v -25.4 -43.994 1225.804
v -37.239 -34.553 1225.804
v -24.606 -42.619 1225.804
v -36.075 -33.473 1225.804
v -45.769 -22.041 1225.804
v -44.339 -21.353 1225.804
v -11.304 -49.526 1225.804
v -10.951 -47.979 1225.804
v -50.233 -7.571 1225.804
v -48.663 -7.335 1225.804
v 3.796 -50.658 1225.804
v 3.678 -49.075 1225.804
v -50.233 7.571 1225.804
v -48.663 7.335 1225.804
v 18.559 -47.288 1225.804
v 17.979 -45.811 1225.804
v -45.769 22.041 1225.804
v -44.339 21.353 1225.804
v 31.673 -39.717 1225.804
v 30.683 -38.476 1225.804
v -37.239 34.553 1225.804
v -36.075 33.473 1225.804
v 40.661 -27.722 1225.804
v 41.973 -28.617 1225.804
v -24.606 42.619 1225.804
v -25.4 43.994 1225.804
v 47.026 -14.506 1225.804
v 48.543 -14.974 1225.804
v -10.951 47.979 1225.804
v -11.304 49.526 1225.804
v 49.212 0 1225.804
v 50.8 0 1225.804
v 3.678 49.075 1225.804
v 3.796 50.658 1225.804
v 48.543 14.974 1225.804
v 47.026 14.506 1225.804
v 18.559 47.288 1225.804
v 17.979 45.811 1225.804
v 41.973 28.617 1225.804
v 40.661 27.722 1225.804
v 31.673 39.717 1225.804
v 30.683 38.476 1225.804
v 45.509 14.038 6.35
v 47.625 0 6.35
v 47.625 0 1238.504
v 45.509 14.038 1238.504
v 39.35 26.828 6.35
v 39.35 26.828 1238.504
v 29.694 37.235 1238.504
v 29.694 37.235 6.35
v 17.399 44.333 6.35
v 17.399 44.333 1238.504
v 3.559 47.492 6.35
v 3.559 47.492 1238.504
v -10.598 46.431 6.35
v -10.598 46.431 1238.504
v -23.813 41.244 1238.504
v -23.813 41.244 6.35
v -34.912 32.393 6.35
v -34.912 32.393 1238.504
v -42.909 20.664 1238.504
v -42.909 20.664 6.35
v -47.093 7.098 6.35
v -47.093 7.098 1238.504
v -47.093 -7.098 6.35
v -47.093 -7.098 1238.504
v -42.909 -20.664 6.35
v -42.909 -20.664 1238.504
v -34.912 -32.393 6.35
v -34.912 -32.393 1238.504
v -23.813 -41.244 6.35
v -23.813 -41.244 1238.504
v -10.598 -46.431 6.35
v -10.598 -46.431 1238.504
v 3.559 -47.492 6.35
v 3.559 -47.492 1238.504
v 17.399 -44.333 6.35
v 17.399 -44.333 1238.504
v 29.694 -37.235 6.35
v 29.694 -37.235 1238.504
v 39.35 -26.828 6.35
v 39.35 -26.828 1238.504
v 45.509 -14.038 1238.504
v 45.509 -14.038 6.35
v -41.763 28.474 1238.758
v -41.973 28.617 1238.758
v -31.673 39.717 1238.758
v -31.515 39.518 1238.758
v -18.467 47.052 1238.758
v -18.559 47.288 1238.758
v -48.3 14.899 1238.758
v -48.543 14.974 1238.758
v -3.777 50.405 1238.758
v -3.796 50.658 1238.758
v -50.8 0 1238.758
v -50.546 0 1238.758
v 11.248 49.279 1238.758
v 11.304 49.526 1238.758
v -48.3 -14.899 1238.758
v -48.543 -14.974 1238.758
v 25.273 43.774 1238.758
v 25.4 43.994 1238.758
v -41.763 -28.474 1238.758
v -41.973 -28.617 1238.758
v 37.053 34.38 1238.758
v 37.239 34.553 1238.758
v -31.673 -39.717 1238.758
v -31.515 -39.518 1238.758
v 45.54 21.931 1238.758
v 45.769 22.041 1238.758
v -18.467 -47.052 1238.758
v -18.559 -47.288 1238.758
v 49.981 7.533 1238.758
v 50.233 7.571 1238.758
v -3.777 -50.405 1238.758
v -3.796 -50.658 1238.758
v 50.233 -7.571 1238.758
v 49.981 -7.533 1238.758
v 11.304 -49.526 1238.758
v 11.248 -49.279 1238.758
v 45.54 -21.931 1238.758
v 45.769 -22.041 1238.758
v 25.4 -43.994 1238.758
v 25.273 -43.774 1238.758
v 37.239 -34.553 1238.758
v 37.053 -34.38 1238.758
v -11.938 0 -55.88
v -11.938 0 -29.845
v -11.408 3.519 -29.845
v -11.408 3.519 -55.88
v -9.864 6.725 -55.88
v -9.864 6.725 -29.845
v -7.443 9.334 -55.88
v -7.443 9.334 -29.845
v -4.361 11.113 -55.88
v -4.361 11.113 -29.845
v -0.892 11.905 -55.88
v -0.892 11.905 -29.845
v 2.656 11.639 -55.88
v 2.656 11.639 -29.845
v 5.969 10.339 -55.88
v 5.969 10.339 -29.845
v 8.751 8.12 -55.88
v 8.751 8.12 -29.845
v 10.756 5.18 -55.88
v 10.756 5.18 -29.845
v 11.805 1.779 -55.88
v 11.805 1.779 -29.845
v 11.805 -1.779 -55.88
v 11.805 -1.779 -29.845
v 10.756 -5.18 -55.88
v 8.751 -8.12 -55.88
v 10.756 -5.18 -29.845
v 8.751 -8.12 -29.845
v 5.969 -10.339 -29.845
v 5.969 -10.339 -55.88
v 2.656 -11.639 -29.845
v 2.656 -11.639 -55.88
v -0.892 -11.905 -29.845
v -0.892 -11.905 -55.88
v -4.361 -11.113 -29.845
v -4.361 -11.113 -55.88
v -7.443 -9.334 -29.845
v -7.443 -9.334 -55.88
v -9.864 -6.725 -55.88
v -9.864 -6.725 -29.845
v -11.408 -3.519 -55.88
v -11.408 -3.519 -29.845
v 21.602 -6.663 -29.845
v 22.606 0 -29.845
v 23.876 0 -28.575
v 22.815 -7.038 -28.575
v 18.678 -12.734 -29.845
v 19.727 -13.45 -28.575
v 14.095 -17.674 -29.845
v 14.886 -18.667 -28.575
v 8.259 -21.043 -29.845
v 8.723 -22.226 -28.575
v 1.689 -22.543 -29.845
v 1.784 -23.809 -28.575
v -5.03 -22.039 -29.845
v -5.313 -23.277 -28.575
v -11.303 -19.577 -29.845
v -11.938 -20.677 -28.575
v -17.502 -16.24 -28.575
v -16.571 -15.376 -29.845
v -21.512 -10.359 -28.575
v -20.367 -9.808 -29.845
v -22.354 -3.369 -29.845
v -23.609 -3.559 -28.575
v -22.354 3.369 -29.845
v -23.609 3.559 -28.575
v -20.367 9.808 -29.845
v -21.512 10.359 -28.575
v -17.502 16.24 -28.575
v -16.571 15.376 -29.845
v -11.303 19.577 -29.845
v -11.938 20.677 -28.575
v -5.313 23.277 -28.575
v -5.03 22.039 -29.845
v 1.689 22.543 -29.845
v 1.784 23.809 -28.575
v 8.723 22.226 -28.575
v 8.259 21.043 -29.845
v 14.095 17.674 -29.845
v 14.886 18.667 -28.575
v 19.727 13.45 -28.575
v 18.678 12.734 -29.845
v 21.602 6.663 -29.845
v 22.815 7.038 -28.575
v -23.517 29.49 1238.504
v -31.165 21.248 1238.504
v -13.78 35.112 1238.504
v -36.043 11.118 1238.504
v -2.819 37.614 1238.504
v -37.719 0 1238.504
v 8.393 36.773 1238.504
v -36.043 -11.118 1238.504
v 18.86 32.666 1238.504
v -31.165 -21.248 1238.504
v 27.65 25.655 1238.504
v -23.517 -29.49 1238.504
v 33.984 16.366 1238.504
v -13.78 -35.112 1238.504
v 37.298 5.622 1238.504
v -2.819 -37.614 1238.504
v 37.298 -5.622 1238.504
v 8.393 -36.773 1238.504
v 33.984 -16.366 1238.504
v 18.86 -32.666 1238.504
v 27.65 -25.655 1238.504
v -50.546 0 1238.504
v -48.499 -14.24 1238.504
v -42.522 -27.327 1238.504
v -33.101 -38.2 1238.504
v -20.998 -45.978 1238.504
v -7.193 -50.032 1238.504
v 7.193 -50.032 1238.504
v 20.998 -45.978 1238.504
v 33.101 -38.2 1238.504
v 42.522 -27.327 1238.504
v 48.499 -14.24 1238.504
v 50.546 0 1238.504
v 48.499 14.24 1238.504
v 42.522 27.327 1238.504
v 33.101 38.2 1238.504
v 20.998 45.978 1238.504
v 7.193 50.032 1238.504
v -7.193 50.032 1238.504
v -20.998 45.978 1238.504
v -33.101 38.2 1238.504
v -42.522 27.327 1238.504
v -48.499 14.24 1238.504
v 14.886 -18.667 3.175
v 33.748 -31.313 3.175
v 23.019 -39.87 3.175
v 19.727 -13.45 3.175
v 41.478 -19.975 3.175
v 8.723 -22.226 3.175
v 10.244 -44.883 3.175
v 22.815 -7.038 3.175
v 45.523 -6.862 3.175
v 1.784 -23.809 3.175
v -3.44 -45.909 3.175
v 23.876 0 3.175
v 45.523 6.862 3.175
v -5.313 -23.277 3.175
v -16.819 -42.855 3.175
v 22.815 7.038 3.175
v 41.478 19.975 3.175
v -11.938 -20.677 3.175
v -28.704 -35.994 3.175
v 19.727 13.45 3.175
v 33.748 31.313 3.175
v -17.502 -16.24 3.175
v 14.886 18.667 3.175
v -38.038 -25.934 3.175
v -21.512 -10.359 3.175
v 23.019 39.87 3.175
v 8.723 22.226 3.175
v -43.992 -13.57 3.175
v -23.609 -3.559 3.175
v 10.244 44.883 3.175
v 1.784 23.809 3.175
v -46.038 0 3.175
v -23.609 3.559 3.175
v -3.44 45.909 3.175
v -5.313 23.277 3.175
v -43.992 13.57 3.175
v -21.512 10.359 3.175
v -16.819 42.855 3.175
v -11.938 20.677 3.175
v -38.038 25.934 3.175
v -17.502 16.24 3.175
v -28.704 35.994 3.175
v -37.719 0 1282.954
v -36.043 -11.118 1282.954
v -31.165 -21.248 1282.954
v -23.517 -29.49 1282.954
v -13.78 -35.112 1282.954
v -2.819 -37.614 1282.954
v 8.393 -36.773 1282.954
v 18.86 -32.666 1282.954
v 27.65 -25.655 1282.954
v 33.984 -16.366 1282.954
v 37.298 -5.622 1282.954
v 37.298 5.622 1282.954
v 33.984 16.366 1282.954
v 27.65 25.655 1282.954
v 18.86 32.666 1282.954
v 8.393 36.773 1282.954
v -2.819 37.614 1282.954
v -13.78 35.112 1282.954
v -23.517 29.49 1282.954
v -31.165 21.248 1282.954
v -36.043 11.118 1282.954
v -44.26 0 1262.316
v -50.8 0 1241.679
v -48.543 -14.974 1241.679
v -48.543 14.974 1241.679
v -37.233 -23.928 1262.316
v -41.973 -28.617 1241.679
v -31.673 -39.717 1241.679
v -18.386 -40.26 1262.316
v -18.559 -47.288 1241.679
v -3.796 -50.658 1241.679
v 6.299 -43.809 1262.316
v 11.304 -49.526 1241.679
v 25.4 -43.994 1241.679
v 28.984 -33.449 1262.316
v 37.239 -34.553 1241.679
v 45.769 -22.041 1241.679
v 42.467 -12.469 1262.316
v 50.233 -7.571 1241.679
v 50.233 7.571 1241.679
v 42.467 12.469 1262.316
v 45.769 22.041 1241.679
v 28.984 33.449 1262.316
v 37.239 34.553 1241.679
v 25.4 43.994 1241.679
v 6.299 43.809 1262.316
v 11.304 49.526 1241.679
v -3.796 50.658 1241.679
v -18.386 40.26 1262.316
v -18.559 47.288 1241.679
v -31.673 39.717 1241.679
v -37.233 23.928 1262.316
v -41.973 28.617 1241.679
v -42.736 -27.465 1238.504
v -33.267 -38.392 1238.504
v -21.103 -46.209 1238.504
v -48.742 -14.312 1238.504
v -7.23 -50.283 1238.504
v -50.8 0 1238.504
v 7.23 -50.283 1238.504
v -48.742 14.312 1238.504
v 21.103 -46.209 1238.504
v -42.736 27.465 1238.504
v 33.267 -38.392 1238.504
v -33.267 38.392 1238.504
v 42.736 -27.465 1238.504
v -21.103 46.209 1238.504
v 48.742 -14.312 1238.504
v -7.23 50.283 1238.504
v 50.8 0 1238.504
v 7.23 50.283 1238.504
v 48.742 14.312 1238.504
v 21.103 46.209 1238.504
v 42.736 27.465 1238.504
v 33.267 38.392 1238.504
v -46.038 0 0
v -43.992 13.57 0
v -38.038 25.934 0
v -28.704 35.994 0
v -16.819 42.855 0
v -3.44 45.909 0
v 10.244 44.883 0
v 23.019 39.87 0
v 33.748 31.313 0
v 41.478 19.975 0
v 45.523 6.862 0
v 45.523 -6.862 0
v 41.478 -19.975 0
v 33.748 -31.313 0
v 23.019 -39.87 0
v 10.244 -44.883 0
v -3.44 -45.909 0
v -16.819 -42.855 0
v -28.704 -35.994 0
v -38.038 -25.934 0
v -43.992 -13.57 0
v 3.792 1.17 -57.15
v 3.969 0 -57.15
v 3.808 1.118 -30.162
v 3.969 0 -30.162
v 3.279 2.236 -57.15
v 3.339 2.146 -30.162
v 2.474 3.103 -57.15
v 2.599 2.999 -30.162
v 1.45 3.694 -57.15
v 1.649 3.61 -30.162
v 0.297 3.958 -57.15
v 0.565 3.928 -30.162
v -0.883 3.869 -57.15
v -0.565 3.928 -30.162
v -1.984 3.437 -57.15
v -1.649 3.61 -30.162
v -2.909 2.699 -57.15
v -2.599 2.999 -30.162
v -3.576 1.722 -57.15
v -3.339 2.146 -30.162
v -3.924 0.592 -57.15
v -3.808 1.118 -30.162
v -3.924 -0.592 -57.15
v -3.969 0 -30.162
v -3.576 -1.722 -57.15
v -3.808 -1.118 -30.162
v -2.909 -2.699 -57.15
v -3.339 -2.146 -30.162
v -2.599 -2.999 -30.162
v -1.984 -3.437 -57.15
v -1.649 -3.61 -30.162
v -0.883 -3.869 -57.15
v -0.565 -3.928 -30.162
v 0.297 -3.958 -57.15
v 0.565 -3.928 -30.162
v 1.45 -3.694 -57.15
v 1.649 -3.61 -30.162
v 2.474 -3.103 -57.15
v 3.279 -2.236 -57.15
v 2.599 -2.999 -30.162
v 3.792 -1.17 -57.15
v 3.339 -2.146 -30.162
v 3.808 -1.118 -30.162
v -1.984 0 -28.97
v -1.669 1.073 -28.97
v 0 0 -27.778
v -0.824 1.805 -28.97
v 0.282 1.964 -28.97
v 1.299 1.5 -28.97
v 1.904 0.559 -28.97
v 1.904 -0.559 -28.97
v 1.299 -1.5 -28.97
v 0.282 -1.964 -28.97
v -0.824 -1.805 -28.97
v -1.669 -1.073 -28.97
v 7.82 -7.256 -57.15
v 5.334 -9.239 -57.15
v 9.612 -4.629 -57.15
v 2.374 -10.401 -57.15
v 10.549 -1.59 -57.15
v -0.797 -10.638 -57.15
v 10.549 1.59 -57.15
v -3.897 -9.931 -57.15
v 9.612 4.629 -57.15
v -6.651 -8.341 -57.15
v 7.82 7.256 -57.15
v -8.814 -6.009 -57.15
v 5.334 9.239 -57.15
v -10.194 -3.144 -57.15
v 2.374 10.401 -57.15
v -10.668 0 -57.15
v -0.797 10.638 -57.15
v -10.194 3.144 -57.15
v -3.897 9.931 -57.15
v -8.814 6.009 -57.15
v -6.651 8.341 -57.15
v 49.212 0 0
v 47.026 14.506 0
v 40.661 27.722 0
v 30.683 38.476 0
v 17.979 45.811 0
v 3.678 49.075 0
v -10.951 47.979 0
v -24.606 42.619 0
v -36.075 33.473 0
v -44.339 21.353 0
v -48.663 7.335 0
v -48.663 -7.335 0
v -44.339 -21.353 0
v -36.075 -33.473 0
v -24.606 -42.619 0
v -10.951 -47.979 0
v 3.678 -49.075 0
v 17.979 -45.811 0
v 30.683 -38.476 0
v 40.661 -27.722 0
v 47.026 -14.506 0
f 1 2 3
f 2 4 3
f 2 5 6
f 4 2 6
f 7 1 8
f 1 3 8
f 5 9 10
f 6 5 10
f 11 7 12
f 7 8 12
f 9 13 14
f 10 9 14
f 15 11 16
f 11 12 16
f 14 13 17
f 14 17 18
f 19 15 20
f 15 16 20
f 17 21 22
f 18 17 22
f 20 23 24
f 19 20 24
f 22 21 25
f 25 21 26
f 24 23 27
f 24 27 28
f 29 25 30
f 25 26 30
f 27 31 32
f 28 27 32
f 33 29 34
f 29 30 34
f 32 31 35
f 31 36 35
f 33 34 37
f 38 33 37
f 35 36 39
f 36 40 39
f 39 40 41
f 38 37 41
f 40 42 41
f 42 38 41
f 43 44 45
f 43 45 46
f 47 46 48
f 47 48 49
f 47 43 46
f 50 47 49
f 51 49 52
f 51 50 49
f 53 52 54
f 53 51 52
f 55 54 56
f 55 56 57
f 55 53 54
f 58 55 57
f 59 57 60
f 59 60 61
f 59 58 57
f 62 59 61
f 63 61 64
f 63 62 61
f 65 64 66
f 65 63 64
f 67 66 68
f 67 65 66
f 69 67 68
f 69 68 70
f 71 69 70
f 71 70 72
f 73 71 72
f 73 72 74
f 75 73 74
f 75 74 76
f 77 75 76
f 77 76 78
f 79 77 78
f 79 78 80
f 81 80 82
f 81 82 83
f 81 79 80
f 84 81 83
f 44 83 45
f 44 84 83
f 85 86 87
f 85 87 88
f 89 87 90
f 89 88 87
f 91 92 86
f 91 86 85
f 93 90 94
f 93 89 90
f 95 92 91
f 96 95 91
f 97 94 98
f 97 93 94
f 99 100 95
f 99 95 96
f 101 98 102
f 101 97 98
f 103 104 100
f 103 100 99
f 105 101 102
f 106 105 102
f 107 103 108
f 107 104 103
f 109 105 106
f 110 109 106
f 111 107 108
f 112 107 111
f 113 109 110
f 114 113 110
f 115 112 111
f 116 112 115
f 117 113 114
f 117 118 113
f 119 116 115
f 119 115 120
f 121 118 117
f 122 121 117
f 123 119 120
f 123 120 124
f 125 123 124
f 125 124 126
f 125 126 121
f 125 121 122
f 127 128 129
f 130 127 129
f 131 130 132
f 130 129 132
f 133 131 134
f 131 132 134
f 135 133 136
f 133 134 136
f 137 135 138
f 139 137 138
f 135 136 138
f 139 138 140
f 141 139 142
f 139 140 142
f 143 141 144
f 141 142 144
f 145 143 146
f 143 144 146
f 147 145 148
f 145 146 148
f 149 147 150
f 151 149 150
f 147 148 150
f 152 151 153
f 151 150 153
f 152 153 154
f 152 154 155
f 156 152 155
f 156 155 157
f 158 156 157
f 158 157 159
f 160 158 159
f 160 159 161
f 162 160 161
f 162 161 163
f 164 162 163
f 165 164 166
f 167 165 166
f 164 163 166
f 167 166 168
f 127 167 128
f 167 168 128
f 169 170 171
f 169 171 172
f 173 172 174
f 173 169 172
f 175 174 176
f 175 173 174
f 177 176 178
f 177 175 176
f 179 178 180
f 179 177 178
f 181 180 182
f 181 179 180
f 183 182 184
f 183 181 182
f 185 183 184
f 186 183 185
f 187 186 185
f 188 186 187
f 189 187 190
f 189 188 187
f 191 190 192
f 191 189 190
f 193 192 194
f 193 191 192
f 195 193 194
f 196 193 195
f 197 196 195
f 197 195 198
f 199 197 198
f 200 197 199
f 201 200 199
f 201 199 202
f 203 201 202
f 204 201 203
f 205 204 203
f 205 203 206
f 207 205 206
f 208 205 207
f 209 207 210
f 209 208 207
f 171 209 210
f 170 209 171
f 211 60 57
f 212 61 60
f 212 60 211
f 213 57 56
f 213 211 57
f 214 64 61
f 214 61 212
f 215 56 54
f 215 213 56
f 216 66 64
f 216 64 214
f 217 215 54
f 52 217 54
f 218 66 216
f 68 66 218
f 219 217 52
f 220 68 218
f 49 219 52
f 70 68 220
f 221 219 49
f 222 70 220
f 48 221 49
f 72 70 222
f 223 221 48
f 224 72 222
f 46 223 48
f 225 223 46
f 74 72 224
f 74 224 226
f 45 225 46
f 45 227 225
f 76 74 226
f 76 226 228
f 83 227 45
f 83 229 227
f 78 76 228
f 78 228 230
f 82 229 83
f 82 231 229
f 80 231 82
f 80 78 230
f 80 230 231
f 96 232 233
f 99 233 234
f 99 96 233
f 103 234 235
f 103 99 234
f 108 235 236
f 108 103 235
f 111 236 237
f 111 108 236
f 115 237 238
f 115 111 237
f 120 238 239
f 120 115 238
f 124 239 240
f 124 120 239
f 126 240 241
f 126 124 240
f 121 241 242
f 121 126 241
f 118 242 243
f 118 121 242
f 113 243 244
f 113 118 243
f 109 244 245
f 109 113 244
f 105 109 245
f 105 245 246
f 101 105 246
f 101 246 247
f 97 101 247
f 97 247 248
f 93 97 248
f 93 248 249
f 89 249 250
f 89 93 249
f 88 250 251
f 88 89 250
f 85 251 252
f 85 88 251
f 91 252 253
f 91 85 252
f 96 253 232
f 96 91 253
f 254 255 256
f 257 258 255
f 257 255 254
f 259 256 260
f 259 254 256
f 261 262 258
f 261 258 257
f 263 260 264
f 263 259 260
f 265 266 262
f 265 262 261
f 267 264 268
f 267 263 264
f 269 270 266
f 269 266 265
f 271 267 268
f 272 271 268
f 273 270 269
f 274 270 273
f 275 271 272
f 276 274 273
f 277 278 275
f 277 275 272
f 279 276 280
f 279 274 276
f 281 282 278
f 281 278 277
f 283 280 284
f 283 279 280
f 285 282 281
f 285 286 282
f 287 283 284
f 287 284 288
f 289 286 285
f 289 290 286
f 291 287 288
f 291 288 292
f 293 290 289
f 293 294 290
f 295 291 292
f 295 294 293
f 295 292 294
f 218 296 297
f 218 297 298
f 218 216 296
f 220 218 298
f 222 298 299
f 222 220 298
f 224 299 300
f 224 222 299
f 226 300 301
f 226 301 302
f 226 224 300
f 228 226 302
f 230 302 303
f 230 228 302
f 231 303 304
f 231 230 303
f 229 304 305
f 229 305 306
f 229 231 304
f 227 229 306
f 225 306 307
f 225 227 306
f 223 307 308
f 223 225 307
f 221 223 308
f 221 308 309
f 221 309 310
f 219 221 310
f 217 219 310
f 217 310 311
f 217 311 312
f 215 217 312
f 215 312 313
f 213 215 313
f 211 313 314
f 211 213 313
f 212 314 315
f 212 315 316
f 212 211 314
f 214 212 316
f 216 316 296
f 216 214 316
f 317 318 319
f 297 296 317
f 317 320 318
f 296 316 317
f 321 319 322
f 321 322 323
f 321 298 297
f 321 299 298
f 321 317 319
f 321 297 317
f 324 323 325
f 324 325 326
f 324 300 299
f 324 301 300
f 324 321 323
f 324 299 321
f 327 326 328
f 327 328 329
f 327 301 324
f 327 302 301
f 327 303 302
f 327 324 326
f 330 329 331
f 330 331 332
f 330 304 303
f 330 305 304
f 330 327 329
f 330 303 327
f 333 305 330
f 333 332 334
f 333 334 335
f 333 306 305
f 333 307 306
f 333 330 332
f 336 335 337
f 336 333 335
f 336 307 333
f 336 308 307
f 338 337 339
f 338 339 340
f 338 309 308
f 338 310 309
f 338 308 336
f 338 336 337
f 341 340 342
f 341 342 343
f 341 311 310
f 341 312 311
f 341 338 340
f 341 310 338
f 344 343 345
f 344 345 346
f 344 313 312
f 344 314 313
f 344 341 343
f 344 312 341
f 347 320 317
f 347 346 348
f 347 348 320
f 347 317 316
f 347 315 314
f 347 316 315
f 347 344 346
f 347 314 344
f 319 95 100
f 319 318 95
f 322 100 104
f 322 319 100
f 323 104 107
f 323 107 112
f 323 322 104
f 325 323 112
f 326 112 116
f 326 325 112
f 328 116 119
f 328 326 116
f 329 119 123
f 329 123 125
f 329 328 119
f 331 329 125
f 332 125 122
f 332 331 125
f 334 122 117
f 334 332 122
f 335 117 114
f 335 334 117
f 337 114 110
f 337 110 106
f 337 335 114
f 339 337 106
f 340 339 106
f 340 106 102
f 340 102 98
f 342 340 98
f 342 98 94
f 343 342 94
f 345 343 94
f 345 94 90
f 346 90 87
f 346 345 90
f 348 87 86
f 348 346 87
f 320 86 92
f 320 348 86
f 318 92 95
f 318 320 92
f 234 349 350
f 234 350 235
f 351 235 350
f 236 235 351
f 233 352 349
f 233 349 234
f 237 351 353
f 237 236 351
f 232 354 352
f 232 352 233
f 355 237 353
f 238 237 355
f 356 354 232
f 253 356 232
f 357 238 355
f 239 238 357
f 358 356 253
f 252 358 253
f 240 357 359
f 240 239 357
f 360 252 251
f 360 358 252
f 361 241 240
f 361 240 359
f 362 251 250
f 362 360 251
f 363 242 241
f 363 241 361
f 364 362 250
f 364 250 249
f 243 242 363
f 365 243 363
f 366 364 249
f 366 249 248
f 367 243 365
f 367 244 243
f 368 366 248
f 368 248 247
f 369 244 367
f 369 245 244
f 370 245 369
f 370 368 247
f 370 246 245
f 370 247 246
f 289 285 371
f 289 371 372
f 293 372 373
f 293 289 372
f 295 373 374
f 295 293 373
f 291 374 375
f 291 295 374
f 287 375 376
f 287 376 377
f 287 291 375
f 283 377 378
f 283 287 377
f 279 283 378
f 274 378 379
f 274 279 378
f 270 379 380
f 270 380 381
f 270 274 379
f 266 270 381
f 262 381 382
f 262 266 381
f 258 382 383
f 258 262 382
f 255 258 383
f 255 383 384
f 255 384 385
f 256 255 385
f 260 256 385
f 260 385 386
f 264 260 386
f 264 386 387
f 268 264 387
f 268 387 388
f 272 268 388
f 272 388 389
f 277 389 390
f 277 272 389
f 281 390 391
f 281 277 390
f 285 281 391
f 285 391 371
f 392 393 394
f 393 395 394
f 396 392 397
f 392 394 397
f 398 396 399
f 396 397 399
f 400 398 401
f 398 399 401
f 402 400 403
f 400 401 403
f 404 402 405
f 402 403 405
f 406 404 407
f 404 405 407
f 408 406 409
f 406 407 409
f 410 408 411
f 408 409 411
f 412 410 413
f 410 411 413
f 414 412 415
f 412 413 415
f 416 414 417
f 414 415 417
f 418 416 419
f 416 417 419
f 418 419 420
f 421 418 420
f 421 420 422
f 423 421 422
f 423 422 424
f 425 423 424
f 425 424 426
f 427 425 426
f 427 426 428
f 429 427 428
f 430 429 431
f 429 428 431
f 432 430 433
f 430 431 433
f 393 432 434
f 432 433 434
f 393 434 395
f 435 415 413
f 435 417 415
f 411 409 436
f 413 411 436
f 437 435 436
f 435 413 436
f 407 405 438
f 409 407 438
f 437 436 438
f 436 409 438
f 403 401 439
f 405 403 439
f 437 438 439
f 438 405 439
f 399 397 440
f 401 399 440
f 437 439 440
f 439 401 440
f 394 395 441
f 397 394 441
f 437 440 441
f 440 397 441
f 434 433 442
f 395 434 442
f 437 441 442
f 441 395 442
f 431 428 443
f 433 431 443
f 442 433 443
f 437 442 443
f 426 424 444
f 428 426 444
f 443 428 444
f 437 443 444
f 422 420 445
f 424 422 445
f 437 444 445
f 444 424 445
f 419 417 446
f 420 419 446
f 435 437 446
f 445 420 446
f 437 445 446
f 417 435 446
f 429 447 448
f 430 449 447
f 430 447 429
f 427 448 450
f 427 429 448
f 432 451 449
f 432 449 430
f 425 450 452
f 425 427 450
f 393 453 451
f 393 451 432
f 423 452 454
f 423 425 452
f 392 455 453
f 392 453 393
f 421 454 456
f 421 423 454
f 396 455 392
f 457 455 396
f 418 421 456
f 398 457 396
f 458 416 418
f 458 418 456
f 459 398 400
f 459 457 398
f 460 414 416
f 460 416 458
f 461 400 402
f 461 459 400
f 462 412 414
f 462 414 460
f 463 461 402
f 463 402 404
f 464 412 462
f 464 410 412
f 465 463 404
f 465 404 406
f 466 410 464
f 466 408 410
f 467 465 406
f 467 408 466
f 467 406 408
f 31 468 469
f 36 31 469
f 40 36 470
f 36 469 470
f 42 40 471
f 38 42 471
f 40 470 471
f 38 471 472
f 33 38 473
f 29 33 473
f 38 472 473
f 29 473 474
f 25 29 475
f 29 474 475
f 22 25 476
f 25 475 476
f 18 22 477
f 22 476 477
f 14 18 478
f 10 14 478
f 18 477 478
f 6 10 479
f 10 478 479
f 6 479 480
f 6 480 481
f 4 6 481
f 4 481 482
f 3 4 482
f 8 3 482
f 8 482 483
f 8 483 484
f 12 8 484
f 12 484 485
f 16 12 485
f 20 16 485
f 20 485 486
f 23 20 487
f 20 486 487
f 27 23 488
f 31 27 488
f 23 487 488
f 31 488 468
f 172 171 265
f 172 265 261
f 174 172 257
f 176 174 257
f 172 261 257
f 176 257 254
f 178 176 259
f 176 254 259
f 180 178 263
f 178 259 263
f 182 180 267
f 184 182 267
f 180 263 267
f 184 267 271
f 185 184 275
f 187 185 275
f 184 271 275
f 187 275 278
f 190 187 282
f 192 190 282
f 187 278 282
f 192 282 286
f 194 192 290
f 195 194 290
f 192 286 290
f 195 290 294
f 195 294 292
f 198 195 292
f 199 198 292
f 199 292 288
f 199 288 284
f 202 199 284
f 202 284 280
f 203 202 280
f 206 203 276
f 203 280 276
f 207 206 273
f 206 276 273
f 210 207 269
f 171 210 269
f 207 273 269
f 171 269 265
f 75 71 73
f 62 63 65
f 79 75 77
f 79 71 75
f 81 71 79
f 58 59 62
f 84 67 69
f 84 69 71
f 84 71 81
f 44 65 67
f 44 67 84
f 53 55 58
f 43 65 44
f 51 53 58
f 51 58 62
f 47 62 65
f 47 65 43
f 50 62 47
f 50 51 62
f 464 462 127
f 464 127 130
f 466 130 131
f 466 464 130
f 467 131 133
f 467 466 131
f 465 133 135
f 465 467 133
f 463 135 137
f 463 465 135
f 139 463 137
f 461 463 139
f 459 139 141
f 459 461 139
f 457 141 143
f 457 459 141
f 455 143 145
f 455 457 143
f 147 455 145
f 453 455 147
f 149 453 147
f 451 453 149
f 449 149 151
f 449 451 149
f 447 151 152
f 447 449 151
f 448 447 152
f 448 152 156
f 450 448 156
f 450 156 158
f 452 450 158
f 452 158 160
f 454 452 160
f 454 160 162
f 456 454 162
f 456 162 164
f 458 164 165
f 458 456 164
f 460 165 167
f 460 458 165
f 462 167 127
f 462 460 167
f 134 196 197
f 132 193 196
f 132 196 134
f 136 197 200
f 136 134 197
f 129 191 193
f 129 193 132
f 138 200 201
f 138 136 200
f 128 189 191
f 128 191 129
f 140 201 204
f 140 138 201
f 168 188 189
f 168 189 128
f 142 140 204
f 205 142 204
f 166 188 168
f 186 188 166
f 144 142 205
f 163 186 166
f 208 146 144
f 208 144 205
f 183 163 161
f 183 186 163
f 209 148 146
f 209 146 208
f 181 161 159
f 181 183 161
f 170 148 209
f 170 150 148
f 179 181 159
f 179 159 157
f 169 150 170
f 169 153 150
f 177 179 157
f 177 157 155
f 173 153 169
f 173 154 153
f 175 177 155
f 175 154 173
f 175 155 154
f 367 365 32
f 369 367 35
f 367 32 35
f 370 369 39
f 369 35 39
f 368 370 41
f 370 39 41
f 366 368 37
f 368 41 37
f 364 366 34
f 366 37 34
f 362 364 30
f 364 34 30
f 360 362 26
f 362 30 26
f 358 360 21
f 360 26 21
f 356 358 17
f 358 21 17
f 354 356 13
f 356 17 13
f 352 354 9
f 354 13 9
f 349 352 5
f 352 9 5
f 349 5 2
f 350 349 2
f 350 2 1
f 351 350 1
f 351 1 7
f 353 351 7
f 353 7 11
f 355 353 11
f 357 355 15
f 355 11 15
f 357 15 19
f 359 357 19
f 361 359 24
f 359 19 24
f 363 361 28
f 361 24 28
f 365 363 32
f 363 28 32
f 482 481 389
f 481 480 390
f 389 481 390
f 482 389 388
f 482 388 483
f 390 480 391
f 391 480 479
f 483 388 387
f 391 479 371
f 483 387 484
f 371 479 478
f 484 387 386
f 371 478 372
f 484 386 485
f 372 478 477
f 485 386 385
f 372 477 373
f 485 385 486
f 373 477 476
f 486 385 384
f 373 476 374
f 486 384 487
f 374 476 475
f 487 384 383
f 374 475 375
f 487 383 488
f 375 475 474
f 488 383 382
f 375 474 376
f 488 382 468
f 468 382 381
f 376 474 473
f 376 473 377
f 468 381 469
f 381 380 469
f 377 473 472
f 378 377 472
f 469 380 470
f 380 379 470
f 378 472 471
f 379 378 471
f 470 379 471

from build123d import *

# Parameters (mm, degrees)
SKETCH1_R                   = 49.2125
SKETCH1_R_2                 = 47.625
BOSS_EXTRUDE1_DEPTH         = 1225.804
SKETCH2_R                   = 50.8
SKETCH2_R_2                 = 47.625
BOSS_EXTRUDE2_DEPTH         = 12.7
SKETCH3_R                   = 47.625
BOSS_EXTRUDE3_DEPTH         = 6.35
SKETCH4_R                   = 23.876
BOSS_EXTRUDE4_DEPTH         = 29.845
SKETCH5_R                   = 11.938
BOSS_EXTRUDE5_DEPTH         = 27.305
CHAMFER1_SIZE               = 1.27
F_3_8_16_TAPPED_HOLE1_D     = 7.9375
F_3_8_16_TAPPED_HOLE1_DEPTH = 26.9875
F_3_8_16_TAPPED_HOLE1_TIP   = 2.384665582
CUT_EXTRUDE1_START          = -3.175
SKETCH8_R                   = 46.0375
SKETCH8_R_2                 = 23.876
CUT_EXTRUDE1_DEPTH          = 3.175


with BuildPart() as part:
    # Sketch1 → Boss-Extrude1 (new body)
    with BuildSketch(Plane.XY):
        Circle(SKETCH1_R)
        Circle(SKETCH1_R_2, mode=Mode.SUBTRACT)
    extrude(amount=BOSS_EXTRUDE1_DEPTH)

    # Sketch2 → Boss-Extrude2 (add)
    with BuildSketch(Plane.XY.offset(1225.804)):
        Circle(SKETCH2_R)
        Circle(SKETCH2_R_2, mode=Mode.SUBTRACT)
    extrude(amount=BOSS_EXTRUDE2_DEPTH)

    # Sketch3 → Boss-Extrude3 (add)
    with BuildSketch(Plane.XY):
        Circle(SKETCH3_R)
    extrude(amount=BOSS_EXTRUDE3_DEPTH)

    # Sketch4 → Boss-Extrude4 (add)
    with BuildSketch(Plane(origin=(0, 0, 0), x_dir=(-1, 0, 0), z_dir=(0, 0, -1))):
        with Locations(Location((0, 0, 0), (0, 0, 180))):
            Circle(SKETCH4_R)
    extrude(amount=BOSS_EXTRUDE4_DEPTH)

    # Sketch5 → Boss-Extrude5 (add)
    with BuildSketch(Plane(origin=(0, 0, -29.845), x_dir=(-1, 0, 0), z_dir=(0, 0, -1))):
        Circle(SKETCH5_R)
    extrude(amount=BOSS_EXTRUDE5_DEPTH)

    # Chamfer1
    chamfer1_edges = [part.edges().sort_by_distance(p)[0] for p in [
        (-23.876, 0, -29.845),
        (11.938, 0, -57.15),
    ]]
    chamfer(chamfer1_edges, length=CHAMFER1_SIZE)

    # 3/8-16 Tapped Hole1
    with Locations(Plane(origin=(0, 0, -57.15), x_dir=(-1, 0, 0), z_dir=(0, 0, -1))):
        with Locations((0, 0)):
            Hole(F_3_8_16_TAPPED_HOLE1_D / 2, depth=F_3_8_16_TAPPED_HOLE1_DEPTH)
            with Locations((0, 0, -(F_3_8_16_TAPPED_HOLE1_DEPTH + F_3_8_16_TAPPED_HOLE1_TIP / 2))):  # 118° drill point
                Cone(0, F_3_8_16_TAPPED_HOLE1_D / 2, F_3_8_16_TAPPED_HOLE1_TIP, mode=Mode.SUBTRACT)

    # Sketch8 → Cut-Extrude1 (cut)
    with BuildSketch(Plane(origin=(0, 0, 0), x_dir=(-1, 0, 0), z_dir=(0, 0, -1)).offset(CUT_EXTRUDE1_START)):
        Circle(SKETCH8_R)
        with Locations(Location((0, 0, 0), (0, 0, 180))):
            Circle(SKETCH8_R_2, mode=Mode.SUBTRACT)
    extrude(amount=CUT_EXTRUDE1_DEPTH, mode=Mode.SUBTRACT)

    # Sketch9 → Revolve1 (revolve)
    with BuildSketch(Plane(origin=(0, 0, 0), x_dir=(1, 0, 0), z_dir=(0, 1, 0))):
        Polygon((-50.8, -1238.758), (-50.8, -1241.679), (-37.719, -1282.954), (-37.719, -1238.504), (-50.546, -1238.504), (-50.546, -1238.758), align=None)
    revolve(axis=Axis((0, 0, 1238.504), (0, 0, 1)))


solid = part.part
